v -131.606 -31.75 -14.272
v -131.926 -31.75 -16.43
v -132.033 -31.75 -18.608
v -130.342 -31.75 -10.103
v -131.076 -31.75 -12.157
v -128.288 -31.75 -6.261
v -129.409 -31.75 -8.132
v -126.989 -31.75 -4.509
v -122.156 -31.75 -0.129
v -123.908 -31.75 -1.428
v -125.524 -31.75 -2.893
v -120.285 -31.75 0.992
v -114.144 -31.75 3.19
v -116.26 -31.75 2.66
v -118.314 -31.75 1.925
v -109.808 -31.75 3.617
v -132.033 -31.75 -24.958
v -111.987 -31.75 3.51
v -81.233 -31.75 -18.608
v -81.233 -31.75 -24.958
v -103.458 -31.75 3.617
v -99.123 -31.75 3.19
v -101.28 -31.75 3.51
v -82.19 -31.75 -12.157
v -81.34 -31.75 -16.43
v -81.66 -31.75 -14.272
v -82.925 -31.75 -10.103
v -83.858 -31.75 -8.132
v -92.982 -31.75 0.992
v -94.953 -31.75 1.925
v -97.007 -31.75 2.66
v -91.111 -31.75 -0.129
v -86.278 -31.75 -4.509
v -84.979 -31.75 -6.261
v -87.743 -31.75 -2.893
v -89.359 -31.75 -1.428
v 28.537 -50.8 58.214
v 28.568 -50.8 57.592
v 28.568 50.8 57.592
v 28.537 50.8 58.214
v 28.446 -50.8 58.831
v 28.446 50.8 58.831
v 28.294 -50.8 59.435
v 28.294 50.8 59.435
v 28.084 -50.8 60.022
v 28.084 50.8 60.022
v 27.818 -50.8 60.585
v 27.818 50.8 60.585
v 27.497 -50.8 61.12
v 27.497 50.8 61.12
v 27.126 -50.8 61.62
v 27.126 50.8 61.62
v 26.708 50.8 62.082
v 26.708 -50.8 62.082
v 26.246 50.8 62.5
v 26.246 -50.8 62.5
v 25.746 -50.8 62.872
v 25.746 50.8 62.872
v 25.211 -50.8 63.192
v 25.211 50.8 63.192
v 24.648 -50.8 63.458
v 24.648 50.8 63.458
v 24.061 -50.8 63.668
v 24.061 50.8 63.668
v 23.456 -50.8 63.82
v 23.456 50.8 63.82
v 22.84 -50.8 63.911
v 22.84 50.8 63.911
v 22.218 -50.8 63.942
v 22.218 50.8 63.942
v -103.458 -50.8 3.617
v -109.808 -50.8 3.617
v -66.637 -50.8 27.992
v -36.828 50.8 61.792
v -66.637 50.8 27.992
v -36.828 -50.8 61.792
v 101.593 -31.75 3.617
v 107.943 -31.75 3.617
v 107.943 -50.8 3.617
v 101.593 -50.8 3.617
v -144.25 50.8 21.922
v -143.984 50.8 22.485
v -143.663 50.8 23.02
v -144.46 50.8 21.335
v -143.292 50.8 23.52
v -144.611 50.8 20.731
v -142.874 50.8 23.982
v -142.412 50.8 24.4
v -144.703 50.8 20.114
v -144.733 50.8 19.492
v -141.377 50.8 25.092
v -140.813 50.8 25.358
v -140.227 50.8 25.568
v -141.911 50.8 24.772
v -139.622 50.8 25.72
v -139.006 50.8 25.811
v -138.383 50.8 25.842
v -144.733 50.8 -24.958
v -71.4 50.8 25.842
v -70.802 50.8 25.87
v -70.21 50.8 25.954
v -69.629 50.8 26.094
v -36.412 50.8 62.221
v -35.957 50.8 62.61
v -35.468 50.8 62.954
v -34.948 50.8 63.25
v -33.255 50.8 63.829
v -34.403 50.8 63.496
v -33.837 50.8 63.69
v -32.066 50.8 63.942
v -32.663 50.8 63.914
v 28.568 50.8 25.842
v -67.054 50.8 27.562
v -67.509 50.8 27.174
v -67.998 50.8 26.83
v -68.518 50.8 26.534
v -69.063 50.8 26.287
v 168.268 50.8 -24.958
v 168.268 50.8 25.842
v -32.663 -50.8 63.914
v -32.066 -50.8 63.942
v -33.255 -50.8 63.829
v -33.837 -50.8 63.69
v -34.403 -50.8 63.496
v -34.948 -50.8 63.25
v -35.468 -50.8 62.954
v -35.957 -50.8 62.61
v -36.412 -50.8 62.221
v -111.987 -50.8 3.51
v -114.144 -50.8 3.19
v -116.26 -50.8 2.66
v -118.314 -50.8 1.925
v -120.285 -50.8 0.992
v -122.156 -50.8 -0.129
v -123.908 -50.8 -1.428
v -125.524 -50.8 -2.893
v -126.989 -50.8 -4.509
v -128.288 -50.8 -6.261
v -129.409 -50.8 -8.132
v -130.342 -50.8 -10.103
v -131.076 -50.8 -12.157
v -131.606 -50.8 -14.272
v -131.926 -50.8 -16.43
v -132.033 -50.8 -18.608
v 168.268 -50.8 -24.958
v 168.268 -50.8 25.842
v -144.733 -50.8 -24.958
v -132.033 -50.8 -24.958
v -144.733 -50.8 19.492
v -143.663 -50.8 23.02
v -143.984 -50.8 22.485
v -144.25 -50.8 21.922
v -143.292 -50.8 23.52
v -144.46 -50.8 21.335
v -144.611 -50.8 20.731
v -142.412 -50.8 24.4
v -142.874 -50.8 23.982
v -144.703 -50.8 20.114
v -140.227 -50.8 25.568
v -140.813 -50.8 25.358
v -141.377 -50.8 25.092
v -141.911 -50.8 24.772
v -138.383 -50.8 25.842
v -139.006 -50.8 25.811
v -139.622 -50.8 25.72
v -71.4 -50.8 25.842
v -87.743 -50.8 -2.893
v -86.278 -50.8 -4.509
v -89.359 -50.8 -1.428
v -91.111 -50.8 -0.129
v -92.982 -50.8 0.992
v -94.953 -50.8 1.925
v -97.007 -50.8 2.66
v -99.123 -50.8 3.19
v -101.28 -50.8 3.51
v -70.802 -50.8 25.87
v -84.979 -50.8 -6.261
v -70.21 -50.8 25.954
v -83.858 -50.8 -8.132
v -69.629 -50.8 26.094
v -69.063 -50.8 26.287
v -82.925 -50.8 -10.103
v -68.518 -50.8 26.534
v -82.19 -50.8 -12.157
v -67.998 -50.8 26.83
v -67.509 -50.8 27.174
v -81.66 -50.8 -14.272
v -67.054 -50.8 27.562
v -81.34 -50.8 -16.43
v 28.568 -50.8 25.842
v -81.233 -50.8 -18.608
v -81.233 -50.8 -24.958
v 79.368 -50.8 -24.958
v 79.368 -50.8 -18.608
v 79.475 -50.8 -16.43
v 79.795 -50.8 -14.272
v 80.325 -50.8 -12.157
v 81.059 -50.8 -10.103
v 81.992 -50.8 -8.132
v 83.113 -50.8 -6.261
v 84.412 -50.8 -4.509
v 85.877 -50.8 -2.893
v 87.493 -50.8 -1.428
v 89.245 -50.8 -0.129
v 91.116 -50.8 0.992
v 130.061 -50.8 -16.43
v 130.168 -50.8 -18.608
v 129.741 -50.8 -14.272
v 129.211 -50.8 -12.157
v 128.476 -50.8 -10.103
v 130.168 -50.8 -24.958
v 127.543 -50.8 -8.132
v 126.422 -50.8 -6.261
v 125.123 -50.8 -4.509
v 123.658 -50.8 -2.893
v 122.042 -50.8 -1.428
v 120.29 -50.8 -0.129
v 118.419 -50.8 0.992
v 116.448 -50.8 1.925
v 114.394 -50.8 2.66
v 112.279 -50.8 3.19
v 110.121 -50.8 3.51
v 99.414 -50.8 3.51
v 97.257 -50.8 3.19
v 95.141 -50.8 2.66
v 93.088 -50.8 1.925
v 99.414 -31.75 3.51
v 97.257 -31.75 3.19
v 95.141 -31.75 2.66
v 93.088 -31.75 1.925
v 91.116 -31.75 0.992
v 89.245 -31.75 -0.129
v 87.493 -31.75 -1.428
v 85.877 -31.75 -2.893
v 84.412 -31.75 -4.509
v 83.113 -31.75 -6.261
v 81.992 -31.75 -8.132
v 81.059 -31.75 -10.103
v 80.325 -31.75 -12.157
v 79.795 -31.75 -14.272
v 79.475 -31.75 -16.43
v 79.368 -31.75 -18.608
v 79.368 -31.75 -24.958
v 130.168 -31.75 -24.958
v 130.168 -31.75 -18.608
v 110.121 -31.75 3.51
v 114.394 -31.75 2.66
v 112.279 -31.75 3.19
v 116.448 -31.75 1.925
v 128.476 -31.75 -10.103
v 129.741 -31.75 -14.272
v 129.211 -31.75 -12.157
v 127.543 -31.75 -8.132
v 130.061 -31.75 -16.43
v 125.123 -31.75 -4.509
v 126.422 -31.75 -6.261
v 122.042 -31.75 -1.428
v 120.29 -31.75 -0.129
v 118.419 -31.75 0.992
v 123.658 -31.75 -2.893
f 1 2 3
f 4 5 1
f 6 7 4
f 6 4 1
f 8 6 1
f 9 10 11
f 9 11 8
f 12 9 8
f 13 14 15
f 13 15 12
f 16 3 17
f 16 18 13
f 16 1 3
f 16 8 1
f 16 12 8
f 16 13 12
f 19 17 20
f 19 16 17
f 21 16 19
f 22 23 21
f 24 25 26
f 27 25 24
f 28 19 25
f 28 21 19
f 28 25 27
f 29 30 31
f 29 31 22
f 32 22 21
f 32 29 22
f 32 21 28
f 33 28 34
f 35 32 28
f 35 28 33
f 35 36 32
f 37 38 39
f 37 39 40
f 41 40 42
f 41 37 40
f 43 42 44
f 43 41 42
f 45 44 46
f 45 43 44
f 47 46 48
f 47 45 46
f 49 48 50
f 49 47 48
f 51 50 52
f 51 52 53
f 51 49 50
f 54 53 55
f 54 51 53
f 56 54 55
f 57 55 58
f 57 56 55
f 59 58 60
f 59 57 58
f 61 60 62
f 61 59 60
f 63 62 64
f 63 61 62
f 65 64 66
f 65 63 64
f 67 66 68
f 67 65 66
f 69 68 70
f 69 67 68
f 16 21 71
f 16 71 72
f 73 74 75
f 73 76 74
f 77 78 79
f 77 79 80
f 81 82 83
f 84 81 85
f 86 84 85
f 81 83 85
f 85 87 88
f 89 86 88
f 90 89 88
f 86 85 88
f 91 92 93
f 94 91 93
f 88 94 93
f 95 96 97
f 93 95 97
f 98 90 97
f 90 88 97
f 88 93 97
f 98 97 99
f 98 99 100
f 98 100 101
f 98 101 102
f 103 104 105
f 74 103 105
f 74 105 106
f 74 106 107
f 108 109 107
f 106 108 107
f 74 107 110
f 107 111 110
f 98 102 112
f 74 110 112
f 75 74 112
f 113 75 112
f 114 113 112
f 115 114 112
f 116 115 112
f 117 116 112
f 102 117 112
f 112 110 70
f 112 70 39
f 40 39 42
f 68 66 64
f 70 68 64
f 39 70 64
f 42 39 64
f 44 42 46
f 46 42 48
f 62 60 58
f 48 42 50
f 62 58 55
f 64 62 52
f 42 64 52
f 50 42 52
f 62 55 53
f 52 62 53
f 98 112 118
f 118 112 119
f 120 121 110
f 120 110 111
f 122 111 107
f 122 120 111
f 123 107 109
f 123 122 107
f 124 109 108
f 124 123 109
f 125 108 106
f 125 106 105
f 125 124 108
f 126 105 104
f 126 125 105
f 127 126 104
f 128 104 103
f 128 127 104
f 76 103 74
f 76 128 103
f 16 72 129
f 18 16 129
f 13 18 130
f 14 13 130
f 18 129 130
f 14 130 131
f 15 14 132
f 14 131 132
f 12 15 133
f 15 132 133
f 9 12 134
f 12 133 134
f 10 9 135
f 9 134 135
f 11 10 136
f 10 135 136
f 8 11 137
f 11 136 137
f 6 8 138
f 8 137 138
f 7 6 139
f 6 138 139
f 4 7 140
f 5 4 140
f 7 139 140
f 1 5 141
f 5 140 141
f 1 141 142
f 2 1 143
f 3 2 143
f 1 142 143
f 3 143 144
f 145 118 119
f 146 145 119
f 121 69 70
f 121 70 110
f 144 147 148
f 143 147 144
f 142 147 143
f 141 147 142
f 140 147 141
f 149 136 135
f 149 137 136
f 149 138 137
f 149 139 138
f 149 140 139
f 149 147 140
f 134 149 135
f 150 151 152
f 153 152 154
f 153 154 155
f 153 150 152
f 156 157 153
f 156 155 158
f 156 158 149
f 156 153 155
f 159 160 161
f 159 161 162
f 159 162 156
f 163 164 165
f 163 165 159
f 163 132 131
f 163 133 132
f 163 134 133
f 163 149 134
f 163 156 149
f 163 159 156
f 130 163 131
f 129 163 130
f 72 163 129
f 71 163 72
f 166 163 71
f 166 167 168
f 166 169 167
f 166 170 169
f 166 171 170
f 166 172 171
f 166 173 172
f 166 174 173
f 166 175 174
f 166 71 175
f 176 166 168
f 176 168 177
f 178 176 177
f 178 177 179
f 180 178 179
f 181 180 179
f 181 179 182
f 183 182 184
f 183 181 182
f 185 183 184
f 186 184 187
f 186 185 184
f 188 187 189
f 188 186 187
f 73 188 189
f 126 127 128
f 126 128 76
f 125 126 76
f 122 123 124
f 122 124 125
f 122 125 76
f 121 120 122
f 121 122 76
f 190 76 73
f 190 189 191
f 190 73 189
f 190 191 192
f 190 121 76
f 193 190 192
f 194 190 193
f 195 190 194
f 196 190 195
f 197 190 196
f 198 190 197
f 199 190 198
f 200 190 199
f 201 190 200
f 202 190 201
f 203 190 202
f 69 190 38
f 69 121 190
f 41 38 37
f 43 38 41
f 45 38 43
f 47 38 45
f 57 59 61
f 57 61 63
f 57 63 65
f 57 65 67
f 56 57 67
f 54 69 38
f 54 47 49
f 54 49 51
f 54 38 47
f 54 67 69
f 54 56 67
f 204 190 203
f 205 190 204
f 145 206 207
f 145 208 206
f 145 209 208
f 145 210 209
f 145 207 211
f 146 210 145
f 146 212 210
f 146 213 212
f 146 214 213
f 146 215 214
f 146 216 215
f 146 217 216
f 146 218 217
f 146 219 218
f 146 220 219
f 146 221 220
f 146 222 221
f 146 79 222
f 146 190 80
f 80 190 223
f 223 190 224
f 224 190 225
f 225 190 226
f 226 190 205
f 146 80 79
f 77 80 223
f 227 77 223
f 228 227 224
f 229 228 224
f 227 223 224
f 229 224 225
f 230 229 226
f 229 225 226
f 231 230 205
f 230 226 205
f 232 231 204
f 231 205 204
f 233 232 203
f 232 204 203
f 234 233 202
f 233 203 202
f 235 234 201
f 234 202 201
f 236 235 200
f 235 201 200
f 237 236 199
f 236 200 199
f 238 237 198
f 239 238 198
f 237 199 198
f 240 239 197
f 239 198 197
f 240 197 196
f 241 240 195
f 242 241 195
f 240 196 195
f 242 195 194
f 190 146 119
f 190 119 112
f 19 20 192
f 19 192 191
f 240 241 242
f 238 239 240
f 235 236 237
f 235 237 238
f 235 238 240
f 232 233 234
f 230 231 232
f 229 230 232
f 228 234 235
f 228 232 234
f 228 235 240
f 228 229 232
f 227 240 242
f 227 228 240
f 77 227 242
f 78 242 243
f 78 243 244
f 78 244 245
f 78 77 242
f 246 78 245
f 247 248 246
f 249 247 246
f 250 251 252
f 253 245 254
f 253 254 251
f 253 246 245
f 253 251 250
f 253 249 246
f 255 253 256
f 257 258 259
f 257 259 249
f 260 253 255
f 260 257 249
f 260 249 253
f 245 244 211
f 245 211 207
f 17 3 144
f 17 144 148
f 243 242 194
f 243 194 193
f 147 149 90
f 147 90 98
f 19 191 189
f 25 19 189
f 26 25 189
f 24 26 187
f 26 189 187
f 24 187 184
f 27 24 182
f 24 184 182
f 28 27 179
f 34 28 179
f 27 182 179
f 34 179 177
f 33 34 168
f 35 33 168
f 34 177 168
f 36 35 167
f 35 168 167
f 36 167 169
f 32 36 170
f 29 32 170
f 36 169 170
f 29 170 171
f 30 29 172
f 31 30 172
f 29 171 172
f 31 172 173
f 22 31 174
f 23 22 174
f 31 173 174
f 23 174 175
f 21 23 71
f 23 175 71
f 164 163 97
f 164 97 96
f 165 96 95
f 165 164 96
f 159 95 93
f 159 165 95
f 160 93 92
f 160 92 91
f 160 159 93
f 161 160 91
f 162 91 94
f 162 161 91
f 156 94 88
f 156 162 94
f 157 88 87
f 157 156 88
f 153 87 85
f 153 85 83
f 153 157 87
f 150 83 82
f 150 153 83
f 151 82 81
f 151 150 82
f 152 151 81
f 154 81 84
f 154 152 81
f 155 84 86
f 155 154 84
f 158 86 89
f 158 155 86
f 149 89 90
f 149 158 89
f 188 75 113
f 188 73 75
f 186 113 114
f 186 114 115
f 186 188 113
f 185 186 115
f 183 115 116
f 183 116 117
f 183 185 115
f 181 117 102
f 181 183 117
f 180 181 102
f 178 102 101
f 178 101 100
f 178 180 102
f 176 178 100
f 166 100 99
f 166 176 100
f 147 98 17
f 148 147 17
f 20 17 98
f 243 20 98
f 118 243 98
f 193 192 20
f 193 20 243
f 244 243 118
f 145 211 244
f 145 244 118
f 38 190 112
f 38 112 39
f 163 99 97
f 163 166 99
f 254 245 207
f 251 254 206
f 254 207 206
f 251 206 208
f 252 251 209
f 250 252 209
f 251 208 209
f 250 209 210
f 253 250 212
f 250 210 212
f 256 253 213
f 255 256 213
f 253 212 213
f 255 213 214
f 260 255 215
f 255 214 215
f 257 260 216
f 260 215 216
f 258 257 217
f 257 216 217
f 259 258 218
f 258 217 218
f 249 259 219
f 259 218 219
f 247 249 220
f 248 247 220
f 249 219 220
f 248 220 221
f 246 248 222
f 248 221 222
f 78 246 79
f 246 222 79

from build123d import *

# Parameters (mm, degrees)
F1_DEPTH = 50.8
F3_DEPTH = 19.05


with BuildPart() as f1:
    # F0 (on Front) → F1 (new body, symmetric)
    with BuildSketch(Plane.XZ):
        with BuildLine():
            Line((-71.399881, 25.841707), (-138.383388, 25.841707))
            ThreePointArc((-138.383388, 25.841707), (-142.873516, 23.981835), (-144.733388, 19.491707))
            Line((-144.733388, 19.491707), (-144.733388, -24.958293))
            Line((-144.733388, -24.958293), (-119.333388, -24.958293))
            Line((-119.333388, -24.958293), (-119.333388, -18.608293))
            ThreePointArc((-119.333388, -18.608293), (-112.823836, -2.892845), (-97.108388, 3.616707))
            Line((-97.108388, 3.616707), (-90.758388, 3.616707))
            ThreePointArc((-90.758388, 3.616707), (-75.042939, -2.892845), (-68.533388, -18.608293))
            Line((-68.533388, -18.608293), (-68.533388, -24.958293))
            Line((-68.533388, -24.958293), (83.866612, -24.958293))
            Line((83.866612, -24.958293), (83.866612, -18.608293))
            ThreePointArc((83.866612, -18.608293), (90.376164, -2.892845), (106.091612, 3.616707))
            Line((106.091612, 3.616707), (112.441612, 3.616707))
            ThreePointArc((112.441612, 3.616707), (128.157061, -2.892845), (134.666612, -18.608293))
            Line((134.666612, -18.608293), (134.666612, -24.958293))
            Line((134.666612, -24.958293), (168.267654, -24.958293))
            Line((168.267654, -24.958293), (168.267654, 25.841707))
            Line((168.267654, 25.841707), (28.567654, 25.841707))
            Line((28.567654, 25.841707), (28.567654, 57.591707))
            ThreePointArc((28.567654, 57.591707), (26.707782, 62.081835), (22.217654, 63.941707))
            Line((22.217654, 63.941707), (-32.065853, 63.941707))
            ThreePointArc((-32.065853, 63.941707), (-34.678483, 63.379337), (-36.828353, 61.791837))
            Line((-36.828353, 61.791837), (-66.637381, 27.991577))
            ThreePointArc((-66.637381, 27.991577), (-68.78725, 26.404077), (-71.399881, 25.841707))
        make_face()
        with BuildLine():
            Line((-119.333388, -18.608293), (-119.333388, -24.958293))
            Line((-119.333388, -24.958293), (-68.533388, -24.958293))
            Line((-68.533388, -24.958293), (-68.533388, -18.608293))
            ThreePointArc((-68.533388, -18.608293), (-75.042939, -2.892845), (-90.758388, 3.616707))
            Line((-90.758388, 3.616707), (-97.108388, 3.616707))
            ThreePointArc((-97.108388, 3.616707), (-112.823836, -2.892845), (-119.333388, -18.608293))
        make_face()
        with BuildLine():
            Line((83.866612, -18.608293), (83.866612, -24.958293))
            Line((83.866612, -24.958293), (134.666612, -24.958293))
            Line((134.666612, -24.958293), (134.666612, -18.608293))
            ThreePointArc((134.666612, -18.608293), (128.157061, -2.892845), (112.441612, 3.616707))
            Line((112.441612, 3.616707), (106.091612, 3.616707))
            ThreePointArc((106.091612, 3.616707), (90.376164, -2.892845), (83.866612, -18.608293))
        make_face()
    extrude(amount=F1_DEPTH, both=True)

    # F2 (on face) → F3 (cut)
    with BuildSketch(Plane.XZ.offset(50.8)):
        with BuildLine():
            Line((-132.033388, -18.608293), (-132.033388, -24.958293))
            Line((-132.033388, -24.958293), (-81.233388, -24.958293))
            Line((-81.233388, -24.958293), (-81.233388, -18.608293))
            ThreePointArc((-81.233388, -18.608293), (-87.742939, -2.892845), (-103.458388, 3.616707))
            Line((-103.458388, 3.616707), (-109.808388, 3.616707))
            ThreePointArc((-109.808388, 3.616707), (-125.523836, -2.892845), (-132.033388, -18.608293))
        make_face()
        with BuildLine():
            Line((79.367654, -18.608293), (79.367654, -24.958293))
            Line((79.367654, -24.958293), (130.167654, -24.958293))
            Line((130.167654, -24.958293), (130.167654, -18.608293))
            ThreePointArc((130.167654, -18.608293), (123.658102, -2.892845), (107.942654, 3.616707))
            Line((107.942654, 3.616707), (101.592654, 3.616707))
            ThreePointArc((101.592654, 3.616707), (85.877206, -2.892845), (79.367654, -18.608293))
        make_face()
    extrude(amount=-F3_DEPTH, mode=Mode.SUBTRACT)


solid = f1.part
